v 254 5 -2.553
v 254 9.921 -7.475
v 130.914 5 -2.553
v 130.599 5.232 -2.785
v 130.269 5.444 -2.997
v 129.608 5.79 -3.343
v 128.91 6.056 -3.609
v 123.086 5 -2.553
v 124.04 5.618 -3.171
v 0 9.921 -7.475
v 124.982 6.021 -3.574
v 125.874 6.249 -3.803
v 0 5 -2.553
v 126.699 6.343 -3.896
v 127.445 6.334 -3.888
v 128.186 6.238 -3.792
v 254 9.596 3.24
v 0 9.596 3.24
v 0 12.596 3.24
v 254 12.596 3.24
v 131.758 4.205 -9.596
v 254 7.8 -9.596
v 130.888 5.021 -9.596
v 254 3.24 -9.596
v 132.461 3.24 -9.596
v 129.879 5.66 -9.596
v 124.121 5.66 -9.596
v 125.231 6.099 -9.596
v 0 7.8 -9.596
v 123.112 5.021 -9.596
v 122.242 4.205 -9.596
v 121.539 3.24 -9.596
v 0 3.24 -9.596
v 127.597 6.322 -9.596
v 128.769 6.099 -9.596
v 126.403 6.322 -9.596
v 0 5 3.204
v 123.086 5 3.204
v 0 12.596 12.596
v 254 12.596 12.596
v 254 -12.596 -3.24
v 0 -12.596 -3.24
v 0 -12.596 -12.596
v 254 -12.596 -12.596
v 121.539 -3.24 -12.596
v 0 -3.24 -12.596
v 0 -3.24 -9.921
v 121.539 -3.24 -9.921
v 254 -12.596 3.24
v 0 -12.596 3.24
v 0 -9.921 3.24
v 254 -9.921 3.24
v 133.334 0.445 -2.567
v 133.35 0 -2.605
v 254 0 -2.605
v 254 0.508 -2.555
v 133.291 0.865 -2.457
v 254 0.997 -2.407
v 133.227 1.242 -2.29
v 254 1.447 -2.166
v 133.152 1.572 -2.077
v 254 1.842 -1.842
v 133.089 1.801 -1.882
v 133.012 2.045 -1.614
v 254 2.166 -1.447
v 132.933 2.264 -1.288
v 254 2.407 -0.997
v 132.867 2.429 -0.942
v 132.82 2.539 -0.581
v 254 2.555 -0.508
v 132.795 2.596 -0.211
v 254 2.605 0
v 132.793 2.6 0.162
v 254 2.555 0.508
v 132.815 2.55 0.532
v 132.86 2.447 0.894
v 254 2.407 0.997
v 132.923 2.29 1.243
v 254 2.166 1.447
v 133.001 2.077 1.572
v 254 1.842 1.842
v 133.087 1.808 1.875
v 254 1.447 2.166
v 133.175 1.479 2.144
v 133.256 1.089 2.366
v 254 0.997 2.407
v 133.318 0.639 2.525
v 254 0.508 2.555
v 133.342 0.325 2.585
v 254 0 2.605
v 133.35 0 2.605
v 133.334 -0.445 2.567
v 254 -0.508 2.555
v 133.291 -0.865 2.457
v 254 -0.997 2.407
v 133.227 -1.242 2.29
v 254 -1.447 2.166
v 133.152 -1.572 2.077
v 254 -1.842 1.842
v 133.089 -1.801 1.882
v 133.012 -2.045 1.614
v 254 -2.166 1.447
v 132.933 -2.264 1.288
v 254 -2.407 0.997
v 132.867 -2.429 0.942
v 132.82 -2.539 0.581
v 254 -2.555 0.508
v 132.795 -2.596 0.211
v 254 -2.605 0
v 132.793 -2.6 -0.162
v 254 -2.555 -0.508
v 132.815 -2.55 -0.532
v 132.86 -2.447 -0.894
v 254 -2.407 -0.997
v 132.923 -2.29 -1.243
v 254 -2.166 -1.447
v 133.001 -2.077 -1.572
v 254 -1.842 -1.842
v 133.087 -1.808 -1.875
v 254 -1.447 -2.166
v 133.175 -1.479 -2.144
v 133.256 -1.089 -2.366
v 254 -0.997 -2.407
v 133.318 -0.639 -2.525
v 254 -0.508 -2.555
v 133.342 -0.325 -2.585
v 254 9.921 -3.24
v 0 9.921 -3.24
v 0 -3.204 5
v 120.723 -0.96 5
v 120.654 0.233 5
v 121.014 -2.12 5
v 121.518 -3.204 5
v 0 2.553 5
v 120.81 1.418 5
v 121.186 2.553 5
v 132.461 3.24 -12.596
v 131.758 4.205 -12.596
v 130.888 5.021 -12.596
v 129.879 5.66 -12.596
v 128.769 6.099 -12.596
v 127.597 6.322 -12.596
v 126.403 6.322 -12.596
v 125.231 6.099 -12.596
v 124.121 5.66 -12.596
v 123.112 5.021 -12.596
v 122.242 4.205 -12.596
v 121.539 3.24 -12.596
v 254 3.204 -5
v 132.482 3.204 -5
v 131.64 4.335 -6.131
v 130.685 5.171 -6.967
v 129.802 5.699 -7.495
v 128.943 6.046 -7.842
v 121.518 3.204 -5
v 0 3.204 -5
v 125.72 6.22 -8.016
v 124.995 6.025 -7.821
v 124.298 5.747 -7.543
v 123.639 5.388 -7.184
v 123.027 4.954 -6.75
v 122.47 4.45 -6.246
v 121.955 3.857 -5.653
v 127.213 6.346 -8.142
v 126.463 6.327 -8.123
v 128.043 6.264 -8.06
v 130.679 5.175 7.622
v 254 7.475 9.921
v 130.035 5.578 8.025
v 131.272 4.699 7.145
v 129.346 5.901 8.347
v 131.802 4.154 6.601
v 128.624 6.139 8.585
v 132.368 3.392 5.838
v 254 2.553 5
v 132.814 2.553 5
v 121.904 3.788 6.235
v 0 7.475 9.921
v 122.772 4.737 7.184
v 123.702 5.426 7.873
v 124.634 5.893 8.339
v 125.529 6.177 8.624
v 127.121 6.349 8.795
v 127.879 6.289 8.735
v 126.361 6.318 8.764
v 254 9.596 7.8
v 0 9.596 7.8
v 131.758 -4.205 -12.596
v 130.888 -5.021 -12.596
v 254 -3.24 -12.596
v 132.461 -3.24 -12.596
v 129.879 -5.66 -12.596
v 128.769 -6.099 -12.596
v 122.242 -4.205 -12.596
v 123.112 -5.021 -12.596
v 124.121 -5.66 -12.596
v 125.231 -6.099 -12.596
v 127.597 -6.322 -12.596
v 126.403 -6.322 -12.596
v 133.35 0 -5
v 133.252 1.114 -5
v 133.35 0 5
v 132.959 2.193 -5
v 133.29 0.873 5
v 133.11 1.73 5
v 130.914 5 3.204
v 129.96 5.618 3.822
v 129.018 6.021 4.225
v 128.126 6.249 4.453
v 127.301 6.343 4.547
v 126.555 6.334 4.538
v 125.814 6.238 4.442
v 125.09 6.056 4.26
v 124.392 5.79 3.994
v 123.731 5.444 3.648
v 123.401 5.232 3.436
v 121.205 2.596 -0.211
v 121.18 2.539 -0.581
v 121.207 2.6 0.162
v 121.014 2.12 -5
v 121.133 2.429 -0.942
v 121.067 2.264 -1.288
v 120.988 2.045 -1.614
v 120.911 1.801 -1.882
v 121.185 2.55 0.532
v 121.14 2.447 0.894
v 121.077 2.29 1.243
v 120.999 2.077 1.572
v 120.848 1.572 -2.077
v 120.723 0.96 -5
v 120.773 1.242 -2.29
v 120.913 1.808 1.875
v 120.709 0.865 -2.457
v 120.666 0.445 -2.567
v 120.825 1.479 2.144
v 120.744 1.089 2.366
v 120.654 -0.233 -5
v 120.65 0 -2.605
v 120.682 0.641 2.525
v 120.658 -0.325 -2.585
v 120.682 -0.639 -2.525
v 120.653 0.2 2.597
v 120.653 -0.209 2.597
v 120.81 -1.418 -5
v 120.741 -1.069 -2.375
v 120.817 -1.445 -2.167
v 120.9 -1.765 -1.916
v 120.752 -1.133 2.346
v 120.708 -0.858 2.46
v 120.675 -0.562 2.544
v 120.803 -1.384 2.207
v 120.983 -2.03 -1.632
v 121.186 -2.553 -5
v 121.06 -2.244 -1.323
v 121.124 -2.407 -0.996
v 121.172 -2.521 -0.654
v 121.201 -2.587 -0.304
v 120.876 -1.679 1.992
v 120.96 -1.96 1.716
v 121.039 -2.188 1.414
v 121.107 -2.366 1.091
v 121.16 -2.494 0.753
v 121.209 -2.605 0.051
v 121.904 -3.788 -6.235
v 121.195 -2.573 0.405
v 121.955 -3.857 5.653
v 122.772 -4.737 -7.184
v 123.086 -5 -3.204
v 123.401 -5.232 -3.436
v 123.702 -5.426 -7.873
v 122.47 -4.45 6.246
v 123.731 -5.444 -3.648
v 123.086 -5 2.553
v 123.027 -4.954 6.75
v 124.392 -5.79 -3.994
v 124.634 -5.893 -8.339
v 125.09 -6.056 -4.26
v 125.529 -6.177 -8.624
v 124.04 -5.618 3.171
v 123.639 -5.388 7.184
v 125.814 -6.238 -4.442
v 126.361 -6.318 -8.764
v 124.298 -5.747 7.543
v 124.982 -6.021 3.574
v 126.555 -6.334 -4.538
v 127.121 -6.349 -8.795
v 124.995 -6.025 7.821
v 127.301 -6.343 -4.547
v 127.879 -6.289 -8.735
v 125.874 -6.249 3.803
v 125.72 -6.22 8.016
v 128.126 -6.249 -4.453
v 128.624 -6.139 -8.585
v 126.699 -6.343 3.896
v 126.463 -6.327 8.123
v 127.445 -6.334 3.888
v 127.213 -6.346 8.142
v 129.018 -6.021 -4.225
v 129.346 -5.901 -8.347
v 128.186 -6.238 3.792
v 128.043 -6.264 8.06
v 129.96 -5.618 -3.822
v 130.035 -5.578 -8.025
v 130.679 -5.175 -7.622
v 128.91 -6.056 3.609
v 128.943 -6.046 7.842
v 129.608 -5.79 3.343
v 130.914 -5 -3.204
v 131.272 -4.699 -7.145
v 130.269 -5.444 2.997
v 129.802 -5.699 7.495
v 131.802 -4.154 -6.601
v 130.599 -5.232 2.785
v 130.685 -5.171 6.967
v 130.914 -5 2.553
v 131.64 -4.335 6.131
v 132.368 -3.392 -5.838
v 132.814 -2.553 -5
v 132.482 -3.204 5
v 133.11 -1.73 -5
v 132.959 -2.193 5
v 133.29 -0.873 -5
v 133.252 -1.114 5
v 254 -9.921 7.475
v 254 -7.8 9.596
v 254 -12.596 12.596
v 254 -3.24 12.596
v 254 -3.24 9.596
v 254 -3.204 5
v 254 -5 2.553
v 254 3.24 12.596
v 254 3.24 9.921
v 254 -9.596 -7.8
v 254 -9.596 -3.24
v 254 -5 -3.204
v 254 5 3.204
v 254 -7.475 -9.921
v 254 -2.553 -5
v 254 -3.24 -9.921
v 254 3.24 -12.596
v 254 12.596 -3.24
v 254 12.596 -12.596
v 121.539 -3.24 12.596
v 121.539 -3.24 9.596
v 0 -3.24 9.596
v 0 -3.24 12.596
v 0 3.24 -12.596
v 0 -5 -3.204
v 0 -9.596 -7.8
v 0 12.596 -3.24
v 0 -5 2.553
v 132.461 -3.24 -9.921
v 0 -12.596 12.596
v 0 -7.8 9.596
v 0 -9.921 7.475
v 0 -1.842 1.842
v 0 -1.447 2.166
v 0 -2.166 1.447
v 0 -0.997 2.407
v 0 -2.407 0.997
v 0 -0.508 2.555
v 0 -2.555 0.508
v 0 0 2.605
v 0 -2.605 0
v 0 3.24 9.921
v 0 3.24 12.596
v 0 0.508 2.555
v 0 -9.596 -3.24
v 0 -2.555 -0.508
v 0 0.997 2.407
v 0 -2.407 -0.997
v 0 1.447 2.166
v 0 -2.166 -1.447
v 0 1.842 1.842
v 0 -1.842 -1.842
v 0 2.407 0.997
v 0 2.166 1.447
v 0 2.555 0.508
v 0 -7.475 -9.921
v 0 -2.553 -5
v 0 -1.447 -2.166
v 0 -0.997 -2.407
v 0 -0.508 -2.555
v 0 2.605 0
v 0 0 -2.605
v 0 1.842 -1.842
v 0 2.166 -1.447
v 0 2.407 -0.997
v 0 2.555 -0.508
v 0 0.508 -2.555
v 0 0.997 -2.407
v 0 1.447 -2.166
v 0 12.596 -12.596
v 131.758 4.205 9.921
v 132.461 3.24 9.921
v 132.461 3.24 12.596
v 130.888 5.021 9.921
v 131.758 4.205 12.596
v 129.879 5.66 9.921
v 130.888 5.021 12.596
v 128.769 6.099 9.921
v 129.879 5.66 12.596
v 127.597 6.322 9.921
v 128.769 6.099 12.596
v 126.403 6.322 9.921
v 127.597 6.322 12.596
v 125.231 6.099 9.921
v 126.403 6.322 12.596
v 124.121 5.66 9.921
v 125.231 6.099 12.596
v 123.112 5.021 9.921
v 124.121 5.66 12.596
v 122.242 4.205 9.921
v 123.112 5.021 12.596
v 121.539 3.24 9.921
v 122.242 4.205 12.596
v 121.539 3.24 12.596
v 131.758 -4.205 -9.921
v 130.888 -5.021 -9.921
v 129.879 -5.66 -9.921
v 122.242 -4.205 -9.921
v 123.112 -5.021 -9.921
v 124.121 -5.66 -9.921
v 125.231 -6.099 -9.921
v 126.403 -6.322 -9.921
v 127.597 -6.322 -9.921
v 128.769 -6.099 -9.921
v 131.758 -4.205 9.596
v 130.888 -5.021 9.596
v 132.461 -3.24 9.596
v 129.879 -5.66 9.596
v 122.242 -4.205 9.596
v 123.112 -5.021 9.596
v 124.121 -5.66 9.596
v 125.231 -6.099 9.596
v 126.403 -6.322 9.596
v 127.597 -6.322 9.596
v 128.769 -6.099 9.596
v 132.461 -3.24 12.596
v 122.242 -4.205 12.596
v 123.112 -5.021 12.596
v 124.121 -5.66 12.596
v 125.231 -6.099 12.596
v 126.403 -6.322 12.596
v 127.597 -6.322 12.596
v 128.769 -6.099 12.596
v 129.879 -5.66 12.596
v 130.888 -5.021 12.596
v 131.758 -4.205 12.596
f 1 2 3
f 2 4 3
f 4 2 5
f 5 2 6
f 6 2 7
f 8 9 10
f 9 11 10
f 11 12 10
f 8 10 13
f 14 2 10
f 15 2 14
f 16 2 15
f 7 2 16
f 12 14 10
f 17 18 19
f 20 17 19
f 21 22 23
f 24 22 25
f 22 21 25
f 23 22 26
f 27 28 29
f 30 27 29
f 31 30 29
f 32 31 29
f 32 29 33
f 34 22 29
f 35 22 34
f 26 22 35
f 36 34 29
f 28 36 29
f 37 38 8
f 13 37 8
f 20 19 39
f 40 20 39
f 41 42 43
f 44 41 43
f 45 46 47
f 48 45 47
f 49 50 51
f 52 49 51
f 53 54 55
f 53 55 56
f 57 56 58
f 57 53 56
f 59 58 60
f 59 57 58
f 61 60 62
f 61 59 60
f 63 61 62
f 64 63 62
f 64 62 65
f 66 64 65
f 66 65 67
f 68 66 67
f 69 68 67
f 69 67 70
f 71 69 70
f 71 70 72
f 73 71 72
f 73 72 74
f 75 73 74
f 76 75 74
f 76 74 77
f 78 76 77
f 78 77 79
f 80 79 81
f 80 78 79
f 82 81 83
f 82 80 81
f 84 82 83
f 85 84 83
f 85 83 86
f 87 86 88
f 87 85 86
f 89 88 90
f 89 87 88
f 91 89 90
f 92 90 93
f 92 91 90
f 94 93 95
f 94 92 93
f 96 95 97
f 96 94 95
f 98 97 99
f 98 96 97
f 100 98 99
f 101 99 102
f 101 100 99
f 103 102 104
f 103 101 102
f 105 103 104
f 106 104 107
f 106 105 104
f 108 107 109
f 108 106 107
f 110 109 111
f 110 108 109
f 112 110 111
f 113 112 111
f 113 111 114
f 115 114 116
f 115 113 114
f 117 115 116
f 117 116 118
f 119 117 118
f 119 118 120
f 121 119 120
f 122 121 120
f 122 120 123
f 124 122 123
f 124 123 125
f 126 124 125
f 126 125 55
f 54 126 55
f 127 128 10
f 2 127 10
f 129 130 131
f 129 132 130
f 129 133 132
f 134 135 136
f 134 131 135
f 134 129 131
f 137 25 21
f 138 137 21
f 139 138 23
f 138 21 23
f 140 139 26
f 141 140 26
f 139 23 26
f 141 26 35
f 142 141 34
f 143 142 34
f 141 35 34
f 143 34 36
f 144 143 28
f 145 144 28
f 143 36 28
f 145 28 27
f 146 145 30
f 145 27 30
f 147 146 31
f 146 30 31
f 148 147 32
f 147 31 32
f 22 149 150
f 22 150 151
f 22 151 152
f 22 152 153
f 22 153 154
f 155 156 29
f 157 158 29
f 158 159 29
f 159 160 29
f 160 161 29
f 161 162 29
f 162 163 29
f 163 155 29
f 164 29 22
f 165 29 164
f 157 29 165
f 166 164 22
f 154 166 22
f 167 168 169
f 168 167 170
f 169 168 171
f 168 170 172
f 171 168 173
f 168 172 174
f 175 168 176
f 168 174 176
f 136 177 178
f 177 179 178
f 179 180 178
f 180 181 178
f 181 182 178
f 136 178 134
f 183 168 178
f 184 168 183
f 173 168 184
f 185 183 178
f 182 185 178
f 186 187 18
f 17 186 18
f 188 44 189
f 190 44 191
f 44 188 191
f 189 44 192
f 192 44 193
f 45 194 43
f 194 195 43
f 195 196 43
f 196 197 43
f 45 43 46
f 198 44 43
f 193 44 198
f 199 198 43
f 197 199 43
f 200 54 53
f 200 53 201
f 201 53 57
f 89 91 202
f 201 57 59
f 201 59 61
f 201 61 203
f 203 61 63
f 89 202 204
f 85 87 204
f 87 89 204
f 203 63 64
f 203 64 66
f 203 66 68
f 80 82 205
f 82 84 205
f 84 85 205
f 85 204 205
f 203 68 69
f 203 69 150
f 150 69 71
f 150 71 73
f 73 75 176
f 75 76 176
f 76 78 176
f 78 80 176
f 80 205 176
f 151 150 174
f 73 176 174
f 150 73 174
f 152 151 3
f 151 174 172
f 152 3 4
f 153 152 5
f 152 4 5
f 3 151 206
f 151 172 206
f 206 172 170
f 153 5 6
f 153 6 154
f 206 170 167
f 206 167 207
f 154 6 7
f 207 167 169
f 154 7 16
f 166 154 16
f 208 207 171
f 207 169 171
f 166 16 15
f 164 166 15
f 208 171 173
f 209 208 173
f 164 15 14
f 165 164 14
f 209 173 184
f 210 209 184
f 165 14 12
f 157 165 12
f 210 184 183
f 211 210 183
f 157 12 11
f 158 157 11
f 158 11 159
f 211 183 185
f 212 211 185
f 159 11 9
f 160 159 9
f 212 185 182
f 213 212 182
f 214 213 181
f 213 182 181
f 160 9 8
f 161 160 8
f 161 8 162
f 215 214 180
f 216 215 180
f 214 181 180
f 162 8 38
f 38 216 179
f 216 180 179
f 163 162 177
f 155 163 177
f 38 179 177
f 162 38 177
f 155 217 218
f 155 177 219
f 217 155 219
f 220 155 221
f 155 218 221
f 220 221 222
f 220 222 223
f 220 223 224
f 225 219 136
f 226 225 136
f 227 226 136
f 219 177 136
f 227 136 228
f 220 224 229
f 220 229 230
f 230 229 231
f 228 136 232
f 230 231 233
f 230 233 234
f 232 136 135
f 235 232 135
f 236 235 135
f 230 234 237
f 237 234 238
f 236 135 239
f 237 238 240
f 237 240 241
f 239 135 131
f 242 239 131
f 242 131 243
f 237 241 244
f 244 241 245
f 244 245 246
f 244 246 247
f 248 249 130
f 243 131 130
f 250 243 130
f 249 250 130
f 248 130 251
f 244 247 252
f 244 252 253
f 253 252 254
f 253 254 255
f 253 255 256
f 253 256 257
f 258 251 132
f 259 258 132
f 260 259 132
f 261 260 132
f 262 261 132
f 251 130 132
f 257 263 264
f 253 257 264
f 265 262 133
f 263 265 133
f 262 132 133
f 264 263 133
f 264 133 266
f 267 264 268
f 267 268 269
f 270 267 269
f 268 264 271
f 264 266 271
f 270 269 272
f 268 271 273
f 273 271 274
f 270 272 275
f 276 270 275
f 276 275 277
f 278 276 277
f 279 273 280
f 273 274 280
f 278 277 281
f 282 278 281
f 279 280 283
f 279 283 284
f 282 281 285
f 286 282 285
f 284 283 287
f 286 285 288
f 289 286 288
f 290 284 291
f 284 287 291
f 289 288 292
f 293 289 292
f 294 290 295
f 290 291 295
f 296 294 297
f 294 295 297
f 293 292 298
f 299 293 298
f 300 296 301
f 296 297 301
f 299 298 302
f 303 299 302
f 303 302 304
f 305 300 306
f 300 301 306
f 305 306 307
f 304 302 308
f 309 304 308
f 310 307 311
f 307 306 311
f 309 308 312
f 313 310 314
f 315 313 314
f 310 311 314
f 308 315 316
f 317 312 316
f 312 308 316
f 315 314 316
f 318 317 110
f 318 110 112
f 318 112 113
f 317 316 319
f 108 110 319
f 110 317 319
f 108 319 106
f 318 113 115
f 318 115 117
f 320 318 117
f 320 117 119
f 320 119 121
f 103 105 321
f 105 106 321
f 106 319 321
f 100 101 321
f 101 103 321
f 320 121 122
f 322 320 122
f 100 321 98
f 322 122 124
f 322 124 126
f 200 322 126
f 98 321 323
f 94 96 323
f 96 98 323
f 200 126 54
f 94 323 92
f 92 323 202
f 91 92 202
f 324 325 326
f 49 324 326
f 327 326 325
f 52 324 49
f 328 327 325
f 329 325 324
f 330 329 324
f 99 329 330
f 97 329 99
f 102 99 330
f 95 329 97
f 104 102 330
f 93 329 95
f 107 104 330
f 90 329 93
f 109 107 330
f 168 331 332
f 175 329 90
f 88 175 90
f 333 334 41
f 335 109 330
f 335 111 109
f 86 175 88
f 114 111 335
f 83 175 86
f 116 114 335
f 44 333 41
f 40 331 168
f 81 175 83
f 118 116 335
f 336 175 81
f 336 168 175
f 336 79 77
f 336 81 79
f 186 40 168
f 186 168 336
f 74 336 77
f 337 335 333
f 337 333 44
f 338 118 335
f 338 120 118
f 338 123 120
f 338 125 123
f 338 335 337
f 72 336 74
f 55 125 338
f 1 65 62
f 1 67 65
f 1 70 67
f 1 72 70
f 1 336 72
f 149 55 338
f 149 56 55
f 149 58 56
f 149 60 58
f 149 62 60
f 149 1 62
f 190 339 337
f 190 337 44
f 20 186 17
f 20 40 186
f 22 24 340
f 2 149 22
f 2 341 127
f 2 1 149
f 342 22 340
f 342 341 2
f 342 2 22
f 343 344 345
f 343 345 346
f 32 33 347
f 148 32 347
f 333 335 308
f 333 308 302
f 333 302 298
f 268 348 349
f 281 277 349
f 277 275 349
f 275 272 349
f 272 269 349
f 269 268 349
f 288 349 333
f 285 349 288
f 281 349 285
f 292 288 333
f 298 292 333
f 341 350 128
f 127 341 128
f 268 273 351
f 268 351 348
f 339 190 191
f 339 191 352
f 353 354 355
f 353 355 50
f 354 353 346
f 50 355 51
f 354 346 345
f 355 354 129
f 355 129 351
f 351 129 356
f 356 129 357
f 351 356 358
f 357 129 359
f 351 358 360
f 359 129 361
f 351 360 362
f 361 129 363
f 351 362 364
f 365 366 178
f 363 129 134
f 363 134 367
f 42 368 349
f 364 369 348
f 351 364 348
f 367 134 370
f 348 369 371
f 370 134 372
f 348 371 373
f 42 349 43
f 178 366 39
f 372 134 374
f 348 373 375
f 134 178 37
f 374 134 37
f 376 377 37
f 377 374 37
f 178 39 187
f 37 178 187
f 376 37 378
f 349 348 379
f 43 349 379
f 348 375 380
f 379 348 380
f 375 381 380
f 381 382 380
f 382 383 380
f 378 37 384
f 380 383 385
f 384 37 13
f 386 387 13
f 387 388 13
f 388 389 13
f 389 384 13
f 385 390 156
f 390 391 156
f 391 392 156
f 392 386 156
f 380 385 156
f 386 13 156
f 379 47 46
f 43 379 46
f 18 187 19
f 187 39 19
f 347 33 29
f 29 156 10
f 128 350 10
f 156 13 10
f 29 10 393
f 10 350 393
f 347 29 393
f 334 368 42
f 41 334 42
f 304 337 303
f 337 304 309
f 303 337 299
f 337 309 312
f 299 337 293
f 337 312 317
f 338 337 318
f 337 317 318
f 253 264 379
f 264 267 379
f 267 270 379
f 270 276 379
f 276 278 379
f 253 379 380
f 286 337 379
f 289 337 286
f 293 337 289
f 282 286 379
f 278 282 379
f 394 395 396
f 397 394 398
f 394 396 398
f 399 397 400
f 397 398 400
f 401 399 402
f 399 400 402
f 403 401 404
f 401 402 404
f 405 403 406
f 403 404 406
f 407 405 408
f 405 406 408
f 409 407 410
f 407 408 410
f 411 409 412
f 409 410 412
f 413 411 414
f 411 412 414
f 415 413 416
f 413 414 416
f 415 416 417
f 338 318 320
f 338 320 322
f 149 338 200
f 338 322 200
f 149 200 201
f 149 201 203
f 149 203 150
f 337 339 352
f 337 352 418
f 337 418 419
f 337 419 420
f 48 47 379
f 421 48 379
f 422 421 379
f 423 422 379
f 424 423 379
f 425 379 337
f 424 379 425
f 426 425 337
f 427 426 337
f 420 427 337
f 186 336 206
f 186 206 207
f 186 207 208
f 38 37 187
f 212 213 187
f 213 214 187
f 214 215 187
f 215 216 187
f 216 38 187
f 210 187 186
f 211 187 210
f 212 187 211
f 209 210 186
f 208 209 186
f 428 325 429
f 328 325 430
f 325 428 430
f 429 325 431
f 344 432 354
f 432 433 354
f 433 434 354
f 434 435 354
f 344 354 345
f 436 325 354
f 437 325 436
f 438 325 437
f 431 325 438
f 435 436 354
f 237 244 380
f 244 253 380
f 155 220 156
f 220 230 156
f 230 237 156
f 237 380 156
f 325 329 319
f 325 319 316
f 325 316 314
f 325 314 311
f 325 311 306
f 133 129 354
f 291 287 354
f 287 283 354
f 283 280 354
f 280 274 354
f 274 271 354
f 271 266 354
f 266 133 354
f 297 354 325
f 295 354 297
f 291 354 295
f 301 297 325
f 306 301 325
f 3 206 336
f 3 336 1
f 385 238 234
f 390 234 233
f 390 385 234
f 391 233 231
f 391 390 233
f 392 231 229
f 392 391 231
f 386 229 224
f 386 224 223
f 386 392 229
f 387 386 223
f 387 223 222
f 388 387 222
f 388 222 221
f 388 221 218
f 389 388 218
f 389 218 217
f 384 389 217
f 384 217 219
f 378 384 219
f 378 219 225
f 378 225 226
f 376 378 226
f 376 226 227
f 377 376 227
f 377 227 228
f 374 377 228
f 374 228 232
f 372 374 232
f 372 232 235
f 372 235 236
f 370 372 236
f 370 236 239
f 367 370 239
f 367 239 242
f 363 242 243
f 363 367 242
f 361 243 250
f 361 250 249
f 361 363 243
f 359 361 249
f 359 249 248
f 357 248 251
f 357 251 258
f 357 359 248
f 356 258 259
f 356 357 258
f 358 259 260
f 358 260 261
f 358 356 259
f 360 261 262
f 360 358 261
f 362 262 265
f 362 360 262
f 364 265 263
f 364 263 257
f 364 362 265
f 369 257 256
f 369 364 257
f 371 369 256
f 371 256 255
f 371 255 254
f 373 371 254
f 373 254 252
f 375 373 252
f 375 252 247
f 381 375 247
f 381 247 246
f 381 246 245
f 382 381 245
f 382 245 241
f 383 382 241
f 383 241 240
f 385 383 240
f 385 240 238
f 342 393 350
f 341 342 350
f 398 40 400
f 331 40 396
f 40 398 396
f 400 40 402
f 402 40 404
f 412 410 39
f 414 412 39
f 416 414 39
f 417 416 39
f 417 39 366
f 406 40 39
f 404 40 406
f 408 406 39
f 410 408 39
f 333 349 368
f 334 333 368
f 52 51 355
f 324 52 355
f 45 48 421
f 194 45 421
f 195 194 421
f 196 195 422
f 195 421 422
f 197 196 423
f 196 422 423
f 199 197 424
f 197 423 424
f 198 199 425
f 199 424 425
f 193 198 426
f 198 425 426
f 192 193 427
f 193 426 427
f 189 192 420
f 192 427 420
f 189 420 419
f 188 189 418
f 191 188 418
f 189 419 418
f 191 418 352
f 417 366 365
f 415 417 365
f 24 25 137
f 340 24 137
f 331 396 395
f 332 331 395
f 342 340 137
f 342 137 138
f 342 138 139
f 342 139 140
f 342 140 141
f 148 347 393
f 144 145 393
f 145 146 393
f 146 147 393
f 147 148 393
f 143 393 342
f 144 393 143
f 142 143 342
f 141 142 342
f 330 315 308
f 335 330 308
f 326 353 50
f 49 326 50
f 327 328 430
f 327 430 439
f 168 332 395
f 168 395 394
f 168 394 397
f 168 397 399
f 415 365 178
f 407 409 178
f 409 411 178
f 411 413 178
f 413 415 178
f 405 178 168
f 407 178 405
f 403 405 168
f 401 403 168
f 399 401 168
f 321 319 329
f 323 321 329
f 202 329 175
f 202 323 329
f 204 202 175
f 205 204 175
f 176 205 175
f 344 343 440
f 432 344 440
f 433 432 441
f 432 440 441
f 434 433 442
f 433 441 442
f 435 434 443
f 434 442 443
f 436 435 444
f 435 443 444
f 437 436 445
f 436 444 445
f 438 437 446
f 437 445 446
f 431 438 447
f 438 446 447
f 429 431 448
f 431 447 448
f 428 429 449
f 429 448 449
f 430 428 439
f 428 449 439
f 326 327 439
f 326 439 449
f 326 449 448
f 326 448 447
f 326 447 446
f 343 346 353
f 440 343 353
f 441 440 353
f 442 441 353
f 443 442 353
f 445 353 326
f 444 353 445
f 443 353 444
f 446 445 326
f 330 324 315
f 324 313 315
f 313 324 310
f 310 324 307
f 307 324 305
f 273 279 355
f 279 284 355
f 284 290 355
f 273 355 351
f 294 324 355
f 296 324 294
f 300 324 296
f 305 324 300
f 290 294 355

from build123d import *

# Parameters (mm, degrees)
SKETCH1_R           = 2.605
BOSS_EXTRUDE1_DEPTH = 254
CIRPATTERN1_COUNT   = 4
SKETCH2_R           = 6.35
CUT_EXTRUDE1_DEPTH  = 30


with BuildPart() as part:
    # Sketch1 → Boss-Extrude1 (new body)
    with BuildSketch(Plane(origin=(0, 0, 0), x_dir=(0, 0, -1), z_dir=(1, 0, 0))):
        Polygon((5, -5), (5, 3.203948776), (9.596194078, 7.800142853), (9.596194078, 3.24), (12.596194078, 3.24), (12.596194078, 12.596194078), (3.24, 12.596194078), (3.24, 9.921463197), (7.474873734, 9.921463197), (2.553410537, 5), (-5, 5), (-5, -5), align=None)
        Circle(SKETCH1_R, mode=Mode.SUBTRACT)
    boss_extrude1 = extrude(amount=BOSS_EXTRUDE1_DEPTH)

    # CirPattern1: Boss-Extrude1 ×4 about axis
    cirpattern1_axis = Axis((0, 0, 0), (1, 0, 0))
    for i in range(1, CIRPATTERN1_COUNT):
        add(boss_extrude1.rotate(cirpattern1_axis, i * 360 / CIRPATTERN1_COUNT))

    # Sketch2 → Cut-Extrude1 (cut)
    with BuildSketch(Plane.XY.offset(12.596194078)):
        with Locations((127, 0)):
            Circle(SKETCH2_R)
    extrude(amount=-CUT_EXTRUDE1_DEPTH, mode=Mode.SUBTRACT)


solid = part.part
